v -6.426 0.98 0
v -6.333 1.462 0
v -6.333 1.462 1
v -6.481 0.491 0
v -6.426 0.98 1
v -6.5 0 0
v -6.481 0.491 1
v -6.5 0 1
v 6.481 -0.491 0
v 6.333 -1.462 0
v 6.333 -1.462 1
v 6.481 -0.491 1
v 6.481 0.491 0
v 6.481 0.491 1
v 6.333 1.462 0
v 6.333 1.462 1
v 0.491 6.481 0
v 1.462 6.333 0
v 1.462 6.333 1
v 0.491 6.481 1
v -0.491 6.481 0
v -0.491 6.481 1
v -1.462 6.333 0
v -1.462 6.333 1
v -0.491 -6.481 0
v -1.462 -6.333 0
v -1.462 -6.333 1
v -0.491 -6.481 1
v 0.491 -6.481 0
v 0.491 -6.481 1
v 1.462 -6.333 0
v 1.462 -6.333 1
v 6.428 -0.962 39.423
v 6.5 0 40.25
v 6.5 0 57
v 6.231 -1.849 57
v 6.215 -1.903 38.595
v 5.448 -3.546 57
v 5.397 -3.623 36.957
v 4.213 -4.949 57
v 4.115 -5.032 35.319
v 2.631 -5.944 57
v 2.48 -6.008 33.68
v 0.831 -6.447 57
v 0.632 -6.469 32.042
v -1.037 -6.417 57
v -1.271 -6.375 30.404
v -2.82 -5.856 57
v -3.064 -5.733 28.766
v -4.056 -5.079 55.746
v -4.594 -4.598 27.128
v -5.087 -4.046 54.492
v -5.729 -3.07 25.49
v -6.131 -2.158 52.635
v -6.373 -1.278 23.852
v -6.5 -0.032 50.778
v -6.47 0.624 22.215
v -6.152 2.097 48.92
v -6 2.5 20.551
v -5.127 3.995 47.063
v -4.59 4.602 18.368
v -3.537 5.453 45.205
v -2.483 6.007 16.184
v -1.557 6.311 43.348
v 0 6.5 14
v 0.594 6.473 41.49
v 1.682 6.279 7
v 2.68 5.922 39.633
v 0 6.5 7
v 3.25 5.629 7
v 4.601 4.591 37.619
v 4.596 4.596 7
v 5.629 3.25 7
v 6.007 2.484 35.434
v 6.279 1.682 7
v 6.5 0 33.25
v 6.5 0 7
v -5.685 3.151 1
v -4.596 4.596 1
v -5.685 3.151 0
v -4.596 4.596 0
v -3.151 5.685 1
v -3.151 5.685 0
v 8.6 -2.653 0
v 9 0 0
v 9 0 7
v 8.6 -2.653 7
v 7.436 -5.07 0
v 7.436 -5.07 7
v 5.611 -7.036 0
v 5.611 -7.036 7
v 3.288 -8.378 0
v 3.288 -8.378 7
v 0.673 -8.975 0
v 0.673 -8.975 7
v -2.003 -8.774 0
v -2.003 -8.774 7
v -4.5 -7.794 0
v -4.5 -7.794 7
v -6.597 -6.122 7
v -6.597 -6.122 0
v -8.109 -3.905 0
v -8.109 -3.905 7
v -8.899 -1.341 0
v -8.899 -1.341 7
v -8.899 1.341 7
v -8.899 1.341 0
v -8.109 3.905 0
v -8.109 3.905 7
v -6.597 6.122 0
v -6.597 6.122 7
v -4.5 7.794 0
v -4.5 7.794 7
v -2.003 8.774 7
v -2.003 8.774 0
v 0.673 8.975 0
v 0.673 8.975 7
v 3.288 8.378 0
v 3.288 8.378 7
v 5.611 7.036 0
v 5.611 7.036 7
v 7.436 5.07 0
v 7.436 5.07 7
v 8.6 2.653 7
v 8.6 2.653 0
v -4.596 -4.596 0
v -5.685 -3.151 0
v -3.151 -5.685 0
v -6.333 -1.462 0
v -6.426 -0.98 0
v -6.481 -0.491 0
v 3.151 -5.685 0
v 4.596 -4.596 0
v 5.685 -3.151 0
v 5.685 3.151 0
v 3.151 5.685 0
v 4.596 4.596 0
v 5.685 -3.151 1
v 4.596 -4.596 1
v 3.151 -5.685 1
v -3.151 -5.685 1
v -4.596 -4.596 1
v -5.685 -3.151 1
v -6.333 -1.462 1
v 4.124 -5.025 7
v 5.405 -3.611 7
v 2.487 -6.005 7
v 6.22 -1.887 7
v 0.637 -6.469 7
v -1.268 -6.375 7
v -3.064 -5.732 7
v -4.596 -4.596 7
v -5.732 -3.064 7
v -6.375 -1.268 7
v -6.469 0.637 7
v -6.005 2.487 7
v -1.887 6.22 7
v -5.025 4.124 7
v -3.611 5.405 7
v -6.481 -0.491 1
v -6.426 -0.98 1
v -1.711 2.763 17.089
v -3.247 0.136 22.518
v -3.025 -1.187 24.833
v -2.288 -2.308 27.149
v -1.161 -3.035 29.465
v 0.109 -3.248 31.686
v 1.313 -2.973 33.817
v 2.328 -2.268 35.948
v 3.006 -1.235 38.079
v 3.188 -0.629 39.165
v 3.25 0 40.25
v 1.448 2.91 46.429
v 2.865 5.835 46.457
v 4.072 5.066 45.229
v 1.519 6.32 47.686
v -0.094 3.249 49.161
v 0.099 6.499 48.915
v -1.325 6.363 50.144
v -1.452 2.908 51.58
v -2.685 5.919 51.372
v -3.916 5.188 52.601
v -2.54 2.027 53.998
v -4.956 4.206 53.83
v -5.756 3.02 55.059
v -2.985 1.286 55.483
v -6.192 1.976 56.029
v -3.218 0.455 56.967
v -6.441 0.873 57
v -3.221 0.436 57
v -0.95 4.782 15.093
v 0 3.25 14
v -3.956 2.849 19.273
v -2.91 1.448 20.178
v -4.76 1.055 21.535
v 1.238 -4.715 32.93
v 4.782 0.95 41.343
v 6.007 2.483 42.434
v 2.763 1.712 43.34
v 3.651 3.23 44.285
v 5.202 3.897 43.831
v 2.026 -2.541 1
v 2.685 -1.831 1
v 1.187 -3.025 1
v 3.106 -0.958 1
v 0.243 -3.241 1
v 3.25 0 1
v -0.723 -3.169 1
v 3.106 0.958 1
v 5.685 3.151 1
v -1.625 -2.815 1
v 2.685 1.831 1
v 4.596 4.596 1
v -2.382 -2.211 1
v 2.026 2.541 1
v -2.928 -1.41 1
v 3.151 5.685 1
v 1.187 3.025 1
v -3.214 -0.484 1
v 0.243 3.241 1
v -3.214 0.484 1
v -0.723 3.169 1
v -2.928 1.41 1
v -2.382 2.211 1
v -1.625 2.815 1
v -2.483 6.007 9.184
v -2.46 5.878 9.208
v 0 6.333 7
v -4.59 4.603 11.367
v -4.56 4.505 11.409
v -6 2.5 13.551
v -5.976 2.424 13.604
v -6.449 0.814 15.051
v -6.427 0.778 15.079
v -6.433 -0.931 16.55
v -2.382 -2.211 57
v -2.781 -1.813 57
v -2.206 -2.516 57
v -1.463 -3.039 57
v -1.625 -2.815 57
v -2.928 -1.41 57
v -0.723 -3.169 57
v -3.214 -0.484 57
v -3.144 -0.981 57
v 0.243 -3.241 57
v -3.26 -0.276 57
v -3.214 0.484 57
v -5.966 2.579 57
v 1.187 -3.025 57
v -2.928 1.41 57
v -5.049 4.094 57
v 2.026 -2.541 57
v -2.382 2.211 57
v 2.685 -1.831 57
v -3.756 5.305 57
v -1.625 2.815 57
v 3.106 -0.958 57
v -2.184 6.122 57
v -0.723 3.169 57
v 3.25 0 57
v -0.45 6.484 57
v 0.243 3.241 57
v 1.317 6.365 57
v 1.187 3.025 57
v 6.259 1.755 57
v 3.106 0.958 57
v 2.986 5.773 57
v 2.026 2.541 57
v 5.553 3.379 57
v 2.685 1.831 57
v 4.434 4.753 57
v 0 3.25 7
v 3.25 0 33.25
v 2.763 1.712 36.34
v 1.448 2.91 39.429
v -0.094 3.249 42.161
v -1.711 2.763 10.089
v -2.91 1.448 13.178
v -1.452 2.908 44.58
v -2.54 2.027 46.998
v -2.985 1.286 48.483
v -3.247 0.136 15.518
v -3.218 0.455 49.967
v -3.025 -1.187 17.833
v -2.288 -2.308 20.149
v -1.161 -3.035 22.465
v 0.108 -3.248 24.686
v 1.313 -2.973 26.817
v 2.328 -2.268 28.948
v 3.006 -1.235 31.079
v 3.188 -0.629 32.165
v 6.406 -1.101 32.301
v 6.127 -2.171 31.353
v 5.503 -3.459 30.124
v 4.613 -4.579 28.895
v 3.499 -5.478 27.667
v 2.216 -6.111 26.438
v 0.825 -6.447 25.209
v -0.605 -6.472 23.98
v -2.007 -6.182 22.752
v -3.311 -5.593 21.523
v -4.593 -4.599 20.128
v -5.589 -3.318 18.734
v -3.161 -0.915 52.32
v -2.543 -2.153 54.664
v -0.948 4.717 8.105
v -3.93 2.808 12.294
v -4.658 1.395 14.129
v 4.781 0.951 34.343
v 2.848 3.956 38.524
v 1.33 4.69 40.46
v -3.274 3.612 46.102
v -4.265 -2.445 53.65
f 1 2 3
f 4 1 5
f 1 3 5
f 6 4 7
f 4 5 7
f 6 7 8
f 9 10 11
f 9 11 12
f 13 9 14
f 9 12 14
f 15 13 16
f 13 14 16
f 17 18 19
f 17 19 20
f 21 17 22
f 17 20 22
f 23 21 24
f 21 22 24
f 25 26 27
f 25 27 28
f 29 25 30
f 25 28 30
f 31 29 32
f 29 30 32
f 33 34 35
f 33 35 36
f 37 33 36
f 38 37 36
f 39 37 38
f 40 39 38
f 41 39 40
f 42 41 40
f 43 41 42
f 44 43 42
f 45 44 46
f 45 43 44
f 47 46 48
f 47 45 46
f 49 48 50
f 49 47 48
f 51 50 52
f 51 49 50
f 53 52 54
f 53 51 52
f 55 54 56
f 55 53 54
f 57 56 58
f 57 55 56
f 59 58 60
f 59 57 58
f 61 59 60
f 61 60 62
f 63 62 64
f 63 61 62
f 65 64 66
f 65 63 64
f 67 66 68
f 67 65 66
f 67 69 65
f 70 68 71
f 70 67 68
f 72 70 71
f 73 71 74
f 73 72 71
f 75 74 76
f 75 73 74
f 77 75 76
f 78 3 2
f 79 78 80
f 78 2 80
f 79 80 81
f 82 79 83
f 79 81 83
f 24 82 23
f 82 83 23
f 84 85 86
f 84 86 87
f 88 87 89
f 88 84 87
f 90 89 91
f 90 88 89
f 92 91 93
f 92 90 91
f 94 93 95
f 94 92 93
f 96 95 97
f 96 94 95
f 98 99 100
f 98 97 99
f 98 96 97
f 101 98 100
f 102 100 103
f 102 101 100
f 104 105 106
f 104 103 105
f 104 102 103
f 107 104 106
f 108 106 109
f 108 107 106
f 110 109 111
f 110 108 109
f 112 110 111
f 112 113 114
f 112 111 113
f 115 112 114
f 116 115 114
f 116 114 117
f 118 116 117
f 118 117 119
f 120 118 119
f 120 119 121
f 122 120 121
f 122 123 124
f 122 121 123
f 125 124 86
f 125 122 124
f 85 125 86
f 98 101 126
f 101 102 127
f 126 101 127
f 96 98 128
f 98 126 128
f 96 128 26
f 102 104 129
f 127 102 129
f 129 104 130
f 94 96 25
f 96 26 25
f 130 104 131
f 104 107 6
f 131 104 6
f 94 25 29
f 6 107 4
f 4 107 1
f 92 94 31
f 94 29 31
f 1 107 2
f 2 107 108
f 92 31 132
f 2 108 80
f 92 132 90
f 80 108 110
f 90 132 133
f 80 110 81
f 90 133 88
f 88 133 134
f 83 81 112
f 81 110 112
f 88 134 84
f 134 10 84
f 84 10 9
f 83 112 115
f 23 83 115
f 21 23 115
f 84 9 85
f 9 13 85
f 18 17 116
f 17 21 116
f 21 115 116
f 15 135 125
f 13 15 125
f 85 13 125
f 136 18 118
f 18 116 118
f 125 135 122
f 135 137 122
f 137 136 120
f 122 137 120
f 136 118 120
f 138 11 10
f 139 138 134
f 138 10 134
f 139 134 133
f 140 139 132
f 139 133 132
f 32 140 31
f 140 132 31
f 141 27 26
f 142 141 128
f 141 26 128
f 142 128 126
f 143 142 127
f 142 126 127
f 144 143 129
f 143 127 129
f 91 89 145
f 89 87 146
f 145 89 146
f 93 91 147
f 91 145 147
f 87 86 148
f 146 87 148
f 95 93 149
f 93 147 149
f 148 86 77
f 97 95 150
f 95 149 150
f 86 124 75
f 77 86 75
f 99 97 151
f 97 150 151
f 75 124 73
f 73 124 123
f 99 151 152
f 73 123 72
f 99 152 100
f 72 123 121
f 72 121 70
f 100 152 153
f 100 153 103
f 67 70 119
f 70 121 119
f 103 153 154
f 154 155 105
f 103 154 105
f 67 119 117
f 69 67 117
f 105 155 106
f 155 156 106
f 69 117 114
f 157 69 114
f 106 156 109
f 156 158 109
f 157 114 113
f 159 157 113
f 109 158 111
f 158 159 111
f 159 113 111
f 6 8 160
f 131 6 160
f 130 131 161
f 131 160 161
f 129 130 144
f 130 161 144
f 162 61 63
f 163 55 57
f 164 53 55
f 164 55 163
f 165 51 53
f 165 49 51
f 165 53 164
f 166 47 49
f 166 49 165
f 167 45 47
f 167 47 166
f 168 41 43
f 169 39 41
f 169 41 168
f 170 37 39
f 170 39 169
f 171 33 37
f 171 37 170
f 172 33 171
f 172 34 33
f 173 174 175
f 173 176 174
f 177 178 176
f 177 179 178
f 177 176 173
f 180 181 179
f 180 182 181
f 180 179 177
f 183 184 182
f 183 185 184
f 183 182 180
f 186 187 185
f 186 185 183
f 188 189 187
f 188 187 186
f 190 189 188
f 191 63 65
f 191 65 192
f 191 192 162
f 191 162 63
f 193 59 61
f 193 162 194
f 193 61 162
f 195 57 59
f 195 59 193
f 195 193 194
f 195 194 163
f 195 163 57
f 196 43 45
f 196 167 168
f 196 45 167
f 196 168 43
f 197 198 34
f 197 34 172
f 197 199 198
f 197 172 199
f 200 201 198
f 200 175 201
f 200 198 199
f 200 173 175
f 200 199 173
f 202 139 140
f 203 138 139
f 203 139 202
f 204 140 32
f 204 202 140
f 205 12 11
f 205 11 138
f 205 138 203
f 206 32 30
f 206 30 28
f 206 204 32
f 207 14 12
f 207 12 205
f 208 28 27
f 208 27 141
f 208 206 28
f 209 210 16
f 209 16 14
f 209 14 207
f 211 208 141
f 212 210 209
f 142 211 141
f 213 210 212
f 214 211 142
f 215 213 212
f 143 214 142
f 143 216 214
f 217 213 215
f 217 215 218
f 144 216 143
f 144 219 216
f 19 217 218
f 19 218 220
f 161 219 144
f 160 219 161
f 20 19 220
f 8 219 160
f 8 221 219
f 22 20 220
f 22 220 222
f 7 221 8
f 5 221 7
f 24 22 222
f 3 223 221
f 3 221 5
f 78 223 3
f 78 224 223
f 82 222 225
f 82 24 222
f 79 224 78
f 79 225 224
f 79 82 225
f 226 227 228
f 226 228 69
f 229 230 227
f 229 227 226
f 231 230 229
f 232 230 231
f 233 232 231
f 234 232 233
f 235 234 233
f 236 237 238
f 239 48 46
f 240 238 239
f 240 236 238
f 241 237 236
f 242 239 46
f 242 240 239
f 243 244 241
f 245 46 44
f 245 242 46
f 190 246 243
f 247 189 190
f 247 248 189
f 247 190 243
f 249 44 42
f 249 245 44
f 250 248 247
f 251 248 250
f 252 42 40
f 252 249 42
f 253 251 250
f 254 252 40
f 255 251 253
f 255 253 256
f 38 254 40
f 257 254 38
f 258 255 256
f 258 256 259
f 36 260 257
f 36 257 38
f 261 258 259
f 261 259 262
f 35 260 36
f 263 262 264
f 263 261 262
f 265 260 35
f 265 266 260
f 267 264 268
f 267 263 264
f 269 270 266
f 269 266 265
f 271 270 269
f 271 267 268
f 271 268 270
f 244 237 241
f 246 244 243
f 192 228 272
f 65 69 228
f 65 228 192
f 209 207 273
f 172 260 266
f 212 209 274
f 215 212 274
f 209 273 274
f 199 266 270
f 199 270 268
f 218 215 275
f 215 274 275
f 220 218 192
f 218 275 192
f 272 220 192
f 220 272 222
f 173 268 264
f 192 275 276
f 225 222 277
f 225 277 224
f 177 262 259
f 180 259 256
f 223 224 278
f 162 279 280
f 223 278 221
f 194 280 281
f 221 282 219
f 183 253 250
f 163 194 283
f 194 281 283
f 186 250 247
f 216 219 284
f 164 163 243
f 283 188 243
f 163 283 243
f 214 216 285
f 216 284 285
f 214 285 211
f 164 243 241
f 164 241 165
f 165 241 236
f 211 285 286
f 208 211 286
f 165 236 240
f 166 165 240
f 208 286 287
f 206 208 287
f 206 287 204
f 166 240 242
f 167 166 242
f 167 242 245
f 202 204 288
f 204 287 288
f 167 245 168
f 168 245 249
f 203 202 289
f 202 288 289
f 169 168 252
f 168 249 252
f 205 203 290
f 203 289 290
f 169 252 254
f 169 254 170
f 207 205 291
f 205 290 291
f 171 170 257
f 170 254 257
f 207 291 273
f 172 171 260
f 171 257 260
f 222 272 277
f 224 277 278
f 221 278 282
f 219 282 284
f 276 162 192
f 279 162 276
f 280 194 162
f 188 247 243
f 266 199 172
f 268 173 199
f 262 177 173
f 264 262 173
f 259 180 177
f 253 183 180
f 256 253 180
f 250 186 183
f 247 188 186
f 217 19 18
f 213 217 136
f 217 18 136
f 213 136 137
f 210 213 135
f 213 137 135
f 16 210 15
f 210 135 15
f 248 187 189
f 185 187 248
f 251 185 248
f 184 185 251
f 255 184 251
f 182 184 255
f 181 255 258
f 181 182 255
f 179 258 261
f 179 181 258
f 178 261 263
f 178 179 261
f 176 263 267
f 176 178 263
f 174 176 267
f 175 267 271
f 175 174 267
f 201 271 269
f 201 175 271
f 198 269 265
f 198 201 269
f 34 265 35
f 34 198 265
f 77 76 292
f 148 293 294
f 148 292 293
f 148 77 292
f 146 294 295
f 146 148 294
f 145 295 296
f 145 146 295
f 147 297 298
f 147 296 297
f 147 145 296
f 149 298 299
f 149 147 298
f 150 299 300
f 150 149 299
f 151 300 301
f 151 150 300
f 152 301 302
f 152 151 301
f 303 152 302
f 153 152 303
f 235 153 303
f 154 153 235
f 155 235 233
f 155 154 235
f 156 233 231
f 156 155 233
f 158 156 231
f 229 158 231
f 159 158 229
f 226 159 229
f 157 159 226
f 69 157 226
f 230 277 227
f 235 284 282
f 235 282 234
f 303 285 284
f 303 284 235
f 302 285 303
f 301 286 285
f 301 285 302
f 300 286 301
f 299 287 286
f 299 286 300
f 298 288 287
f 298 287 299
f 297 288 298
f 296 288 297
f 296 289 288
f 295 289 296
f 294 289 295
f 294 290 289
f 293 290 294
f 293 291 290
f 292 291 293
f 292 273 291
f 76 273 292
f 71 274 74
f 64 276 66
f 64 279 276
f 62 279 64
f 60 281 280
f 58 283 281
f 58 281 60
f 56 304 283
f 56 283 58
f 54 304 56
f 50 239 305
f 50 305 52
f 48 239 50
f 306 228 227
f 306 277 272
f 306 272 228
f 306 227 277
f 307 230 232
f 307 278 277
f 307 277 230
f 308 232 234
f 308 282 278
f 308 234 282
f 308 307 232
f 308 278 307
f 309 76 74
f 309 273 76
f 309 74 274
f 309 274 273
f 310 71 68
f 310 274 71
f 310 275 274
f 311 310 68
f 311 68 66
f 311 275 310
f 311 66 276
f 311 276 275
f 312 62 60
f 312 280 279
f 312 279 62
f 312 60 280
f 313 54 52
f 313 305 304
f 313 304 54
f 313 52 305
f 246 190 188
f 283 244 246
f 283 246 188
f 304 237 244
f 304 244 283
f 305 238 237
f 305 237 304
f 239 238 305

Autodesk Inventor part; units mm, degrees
ref_plane "YZ Plane" through (0, 0, 0) normal (1, 0, 0) x (0, 1, 0)
ref_plane "XY Plane" through (0, 0, 0) normal (0, 0, 1) x (1, 0, 0)
sketch "Sketch1" plane through (0, 0, 0) normal (0, 0, 1) x (1, 0, 0)
  line L0 (0, 0) -> (0, 6)
  circle A0 centre (0, 6) radius 1.5
  circle A1 centre (-4.2426, 4.2426) radius 1.5
  circle A2 centre (-6, 0) radius 1.5
  circle A3 centre (-4.2426, -4.2426) radius 1.5
  circle A4 centre (0, -6) radius 1.5
  circle A5 centre (4.2426, -4.2426) radius 1.5
  circle A6 centre (6, 0) radius 1.5
  circle A7 centre (4.2426, 4.2426) radius 1.5
  circle A8 centre (0, 0) radius 9
  dimension "d0" = 6
  dimension "d1" = 3
  dimension "d4" = 360
  dimension "d6" = 18
extrude "Extrusion1" add sketch "Sketch1" along normal blind 7 contours A1 | A3 | A5 | A7 | A8
sketch "Sketch2" plane through (0, 0, 0) normal (0, 0, -1) x (-1, 0, 0)
  circle A0 centre (0, 0) radius 6.5
  dimension "d9" = 13
extrude "Extrusion2" cut sketch "Sketch2" against normal blind 1
sketch "Sketch3" plane through (0, 0, 7) normal (0, 0, 1) x (1, 0, 0)
  circle A0 centre (0, 0) radius 6.5
  dimension "d12" = 13
extrude "Extrusion3" add sketch "Sketch3" along normal blind 50
sketch "Sketch5" plane through (0, 0, 57) normal (0, 0, 1) x (1, 0, 0)
  circle A0 centre (0, 0) radius 3.25
  dimension "d25" = 6.5
extrude "Extrusion5" cut sketch "Sketch5" against normal up to surface (56 mm away)
ref_plane "Work Plane1" through (0, 12, 0) normal (0, 1, 0) x (-1, 0, 0)
sketch "Sketch8" plane through (0, 0, 7) normal (0, 0, 1) x (1, 0, 0)
  circle A0 centre (0, 0) radius 3
  dimension "d44" = 6
extrude "Extrusion8" cut sketch "Sketch8" against normal through all
sketch "Sketch9" plane through (0, 0, 0) normal (1, 0, 0) x (0, 1, 0)
  line L0 (6.5, 7) -> (6.5, 57) projected
  line L1 (6.5, 7) -> (6.5, 57) projected
  line L2 (6.3333, 7) -> (7.5, 7) projected
  line L3 (7.5, 7) -> (2.5, 7)
  line L4 (2.5, 7) -> (2.5, 14)
  line L5 (2.5, 14) -> (7.5, 14)
  line L6 (7.5, 14) -> (7.5, 7)
  line L7 (0, -11.4) -> (0, 68.4) projected
  point P0 (0, 0)
  dimension "d61" = 5
  dimension "d62" = 7
coil "Coil2" sketch "Sketch9" operation cut axis through (0, 0, 7) along (0, 0, 1) pitch 35 turns 1.428571 hand right taper 1
sketch "Boceto13" plane through (0, 0, 0) normal (0, 0, -1) x (-1, 0, 0)
  arc A0 (-6.3333, 1.4625) -> (-6.3333, -1.4625) centre (-6, 0) ccw projected
  circle A1 centre (-6, 0) radius 1.5
  arc A2 (-1.4625, -6.3333) -> (1.4625, -6.3333) centre (0, -6) ccw projected
  circle A3 centre (0, -6) radius 1.5
  arc A4 (1.4625, 6.3333) -> (-1.4625, 6.3333) centre (0, 6) ccw projected
  circle A5 centre (0, 6) radius 1.5
  arc A6 (6.3333, -1.4625) -> (6.3333, 1.4625) centre (6, 0) ccw projected
  circle A7 centre (6, 0) radius 1.5
  point P0 (0, 0)
extrude "Extrusión9" add sketch "Boceto13" against normal blind 7
sketch "Boceto14" plane through (0, 0, 1) normal (0, 0, -1) x (-1, 0, 0)
  circle A0 centre (0, 0) radius 6.5
extrude "Extrusión10" cut sketch "Boceto14" along normal blind 2
properties part number "ScrewActuatorGripper_2"
